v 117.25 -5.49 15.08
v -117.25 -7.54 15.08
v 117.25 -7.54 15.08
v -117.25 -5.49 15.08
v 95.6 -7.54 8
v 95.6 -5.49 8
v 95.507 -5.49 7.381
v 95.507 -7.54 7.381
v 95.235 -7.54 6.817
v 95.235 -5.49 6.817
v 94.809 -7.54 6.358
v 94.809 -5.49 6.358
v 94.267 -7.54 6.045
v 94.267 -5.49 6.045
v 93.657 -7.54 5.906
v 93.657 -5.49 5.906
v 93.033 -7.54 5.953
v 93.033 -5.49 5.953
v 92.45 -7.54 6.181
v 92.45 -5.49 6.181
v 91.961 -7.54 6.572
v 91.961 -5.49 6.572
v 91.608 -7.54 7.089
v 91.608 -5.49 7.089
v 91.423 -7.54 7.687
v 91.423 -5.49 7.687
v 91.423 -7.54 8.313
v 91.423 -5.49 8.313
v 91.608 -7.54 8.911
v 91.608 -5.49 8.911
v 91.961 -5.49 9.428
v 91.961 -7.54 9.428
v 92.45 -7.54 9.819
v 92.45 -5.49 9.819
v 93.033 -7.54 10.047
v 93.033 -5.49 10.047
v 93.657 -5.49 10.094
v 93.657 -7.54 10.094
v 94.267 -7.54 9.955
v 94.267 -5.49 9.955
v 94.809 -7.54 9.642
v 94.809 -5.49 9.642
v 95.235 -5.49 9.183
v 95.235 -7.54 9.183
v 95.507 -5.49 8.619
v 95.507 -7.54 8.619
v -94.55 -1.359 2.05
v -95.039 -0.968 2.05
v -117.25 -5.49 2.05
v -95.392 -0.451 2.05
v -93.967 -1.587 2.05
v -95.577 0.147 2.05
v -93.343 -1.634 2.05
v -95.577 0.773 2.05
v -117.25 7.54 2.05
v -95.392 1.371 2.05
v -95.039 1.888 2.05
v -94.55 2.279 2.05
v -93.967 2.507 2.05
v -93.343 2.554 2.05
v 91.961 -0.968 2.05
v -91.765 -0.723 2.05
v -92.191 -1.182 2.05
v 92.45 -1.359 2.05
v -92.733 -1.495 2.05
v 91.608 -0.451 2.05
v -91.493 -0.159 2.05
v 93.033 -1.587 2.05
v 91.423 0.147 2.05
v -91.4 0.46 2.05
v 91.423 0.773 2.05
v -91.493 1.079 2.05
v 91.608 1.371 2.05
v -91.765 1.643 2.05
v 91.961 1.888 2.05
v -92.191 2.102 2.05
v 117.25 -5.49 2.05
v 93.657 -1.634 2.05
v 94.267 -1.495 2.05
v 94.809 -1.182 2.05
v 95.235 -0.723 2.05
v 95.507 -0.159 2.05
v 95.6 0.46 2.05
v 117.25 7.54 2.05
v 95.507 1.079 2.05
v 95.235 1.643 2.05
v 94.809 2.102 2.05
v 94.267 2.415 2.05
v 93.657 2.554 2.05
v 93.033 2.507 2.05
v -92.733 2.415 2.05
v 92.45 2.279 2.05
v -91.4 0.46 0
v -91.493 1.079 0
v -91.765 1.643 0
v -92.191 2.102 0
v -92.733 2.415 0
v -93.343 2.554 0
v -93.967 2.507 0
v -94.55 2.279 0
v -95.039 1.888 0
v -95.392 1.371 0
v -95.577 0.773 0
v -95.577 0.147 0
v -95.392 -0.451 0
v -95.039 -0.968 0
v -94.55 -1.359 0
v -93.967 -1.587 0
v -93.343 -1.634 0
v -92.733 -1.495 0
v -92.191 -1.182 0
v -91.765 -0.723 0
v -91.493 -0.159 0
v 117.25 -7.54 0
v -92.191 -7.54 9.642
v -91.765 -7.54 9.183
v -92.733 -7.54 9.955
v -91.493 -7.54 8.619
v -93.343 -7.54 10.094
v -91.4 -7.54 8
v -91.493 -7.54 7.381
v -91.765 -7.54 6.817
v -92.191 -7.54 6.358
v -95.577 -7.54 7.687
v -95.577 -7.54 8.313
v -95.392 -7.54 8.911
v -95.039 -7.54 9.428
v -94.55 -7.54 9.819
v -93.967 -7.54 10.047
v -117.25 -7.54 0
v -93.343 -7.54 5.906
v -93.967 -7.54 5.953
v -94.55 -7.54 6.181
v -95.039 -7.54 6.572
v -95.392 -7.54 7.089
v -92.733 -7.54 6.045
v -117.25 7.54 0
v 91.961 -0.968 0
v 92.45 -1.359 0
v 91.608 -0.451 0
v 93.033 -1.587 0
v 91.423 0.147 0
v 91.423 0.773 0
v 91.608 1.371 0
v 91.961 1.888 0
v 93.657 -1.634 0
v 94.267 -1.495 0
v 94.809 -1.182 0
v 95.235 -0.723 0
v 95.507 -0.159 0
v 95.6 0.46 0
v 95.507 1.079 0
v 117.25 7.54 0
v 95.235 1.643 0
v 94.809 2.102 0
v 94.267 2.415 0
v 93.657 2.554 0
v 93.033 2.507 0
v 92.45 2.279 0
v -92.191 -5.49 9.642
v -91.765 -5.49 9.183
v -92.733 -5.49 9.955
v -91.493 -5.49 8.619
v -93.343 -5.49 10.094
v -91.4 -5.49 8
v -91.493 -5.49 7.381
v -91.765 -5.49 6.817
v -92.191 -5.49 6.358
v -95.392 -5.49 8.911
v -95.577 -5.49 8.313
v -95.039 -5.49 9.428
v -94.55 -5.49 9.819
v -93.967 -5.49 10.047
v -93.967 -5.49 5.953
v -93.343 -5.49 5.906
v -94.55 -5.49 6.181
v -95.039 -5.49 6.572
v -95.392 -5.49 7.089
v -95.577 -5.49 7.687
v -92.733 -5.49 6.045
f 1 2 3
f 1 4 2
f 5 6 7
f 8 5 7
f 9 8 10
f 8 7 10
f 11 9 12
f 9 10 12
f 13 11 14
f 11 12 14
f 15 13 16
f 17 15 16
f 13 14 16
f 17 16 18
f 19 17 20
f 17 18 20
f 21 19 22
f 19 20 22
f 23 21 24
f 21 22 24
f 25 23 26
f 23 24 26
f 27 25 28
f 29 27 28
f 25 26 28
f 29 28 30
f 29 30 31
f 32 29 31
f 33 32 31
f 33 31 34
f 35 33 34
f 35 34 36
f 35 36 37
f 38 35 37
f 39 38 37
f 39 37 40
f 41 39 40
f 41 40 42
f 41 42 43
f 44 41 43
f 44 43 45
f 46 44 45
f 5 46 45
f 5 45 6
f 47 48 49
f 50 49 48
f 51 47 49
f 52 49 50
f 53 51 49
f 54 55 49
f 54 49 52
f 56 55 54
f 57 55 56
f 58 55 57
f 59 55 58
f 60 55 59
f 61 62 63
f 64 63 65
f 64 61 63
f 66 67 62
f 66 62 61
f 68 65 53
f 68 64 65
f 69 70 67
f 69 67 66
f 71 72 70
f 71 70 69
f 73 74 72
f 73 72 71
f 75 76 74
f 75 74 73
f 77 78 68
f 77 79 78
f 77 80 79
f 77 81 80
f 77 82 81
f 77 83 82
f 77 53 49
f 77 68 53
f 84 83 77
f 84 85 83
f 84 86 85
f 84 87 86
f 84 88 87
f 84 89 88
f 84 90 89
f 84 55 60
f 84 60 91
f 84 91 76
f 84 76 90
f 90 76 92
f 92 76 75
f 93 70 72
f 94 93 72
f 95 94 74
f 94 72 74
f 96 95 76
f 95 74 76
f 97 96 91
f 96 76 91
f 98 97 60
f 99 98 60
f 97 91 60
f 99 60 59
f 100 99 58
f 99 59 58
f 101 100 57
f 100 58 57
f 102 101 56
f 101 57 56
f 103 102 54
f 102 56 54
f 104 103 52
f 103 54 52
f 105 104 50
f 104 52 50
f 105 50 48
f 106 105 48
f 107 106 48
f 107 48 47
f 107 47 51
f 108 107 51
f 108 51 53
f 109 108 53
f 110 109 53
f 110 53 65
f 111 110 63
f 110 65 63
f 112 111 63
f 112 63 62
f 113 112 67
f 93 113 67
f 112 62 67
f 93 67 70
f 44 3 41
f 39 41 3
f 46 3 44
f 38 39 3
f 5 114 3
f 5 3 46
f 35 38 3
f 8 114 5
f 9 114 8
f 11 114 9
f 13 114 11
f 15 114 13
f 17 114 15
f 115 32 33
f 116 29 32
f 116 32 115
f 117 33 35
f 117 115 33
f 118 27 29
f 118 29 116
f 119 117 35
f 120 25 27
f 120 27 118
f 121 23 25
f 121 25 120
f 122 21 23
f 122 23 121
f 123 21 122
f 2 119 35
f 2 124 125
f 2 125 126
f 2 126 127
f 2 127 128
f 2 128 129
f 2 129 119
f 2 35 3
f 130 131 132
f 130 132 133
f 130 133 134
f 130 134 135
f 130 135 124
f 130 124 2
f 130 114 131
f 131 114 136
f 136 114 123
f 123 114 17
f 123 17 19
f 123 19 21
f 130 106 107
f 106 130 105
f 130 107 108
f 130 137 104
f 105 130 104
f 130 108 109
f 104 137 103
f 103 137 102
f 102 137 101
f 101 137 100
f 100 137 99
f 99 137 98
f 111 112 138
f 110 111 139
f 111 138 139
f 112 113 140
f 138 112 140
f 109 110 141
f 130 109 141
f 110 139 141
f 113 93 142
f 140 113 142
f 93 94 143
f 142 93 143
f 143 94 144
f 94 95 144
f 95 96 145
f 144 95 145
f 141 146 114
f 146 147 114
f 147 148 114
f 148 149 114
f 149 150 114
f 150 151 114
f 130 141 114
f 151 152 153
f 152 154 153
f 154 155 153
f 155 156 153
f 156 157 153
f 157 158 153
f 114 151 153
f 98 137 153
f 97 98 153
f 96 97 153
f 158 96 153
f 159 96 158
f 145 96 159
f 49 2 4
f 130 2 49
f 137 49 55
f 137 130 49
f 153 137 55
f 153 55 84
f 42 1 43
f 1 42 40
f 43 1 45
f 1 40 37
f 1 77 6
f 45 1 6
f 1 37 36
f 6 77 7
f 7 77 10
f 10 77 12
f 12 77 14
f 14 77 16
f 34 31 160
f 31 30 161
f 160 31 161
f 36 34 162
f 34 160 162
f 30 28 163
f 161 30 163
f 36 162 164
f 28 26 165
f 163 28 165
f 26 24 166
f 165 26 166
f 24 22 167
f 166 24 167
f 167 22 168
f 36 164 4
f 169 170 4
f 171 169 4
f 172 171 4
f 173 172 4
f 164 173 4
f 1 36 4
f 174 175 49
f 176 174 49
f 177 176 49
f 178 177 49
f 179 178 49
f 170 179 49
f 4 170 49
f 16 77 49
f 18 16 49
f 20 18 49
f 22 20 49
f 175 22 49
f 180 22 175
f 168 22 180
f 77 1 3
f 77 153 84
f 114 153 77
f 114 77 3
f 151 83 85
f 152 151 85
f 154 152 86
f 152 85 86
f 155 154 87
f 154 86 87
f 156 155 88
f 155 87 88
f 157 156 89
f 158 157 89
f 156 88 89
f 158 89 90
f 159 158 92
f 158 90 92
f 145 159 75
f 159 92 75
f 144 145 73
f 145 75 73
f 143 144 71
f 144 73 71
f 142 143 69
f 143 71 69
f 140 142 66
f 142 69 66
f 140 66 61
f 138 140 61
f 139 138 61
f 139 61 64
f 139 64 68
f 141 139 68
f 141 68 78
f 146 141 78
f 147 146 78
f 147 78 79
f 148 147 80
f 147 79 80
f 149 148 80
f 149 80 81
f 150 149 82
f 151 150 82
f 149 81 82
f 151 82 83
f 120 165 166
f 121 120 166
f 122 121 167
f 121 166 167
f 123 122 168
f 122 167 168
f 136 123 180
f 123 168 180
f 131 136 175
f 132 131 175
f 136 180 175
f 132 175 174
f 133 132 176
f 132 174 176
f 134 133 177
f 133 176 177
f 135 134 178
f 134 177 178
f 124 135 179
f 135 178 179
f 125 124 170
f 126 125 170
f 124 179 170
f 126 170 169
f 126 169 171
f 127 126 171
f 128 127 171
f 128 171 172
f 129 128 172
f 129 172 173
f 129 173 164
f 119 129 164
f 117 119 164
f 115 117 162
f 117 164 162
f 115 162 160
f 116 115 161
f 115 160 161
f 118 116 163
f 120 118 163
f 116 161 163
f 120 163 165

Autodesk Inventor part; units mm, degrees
ref_plane "YZ Plane" through (0, 0, 0) normal (1, 0, 0) x (0, 1, 0)
ref_plane "XZ Plane" through (0, 0, 0) normal (0, 1, 0) x (-1, 0, 0)
ref_plane "XY Plane" through (0, 0, 0) normal (0, 0, 1) x (1, 0, 0)
sketch "Sketch1" plane through (0, 0, 0) normal (0, 0, 1) x (1, 0, 0)
  line L0 (117.25, -7.54) -> (-117.25, -7.54)
  line L1 (-117.25, -7.54) -> (-117.25, 7.54)
  line L2 (-117.25, 7.54) -> (117.25, 7.54)
  line L3 (117.25, 7.54) -> (117.25, -7.54)
  line L4 (117.25, -7.54) -> (-117.25, 7.54) construction
  line L5 (-117.25, -7.54) -> (117.25, 7.54) construction
  point P0 (0, 0)
  dimension "d0" = 234.5
  dimension "d1" = 15.08
extrude "Extrusion1" add sketch "Sketch1" along normal blind 2.05
sketch "Sketch2" plane through (0, 0, 2.05) normal (0, 0, 1) x (1, 0, 0)
  line L0 (-117.25, -7.54) -> (117.25, -7.54) projected
  line L1 (117.25, -7.54) -> (117.25, 7.54) projected
  line L2 (-117.25, -7.54) -> (117.25, -7.54)
  line L3 (117.25, -7.54) -> (117.25, -5.49)
  line L4 (117.25, -5.49) -> (-117.25, -5.49)
  line L5 (-117.25, -5.49) -> (-117.25, -7.54)
  point P0 (0, 0)
  dimension "d4" = 2.05
extrude "Extrusion2" add sketch "Sketch2" along normal blind 13.03
sketch "Sketch3" plane through (-117.25, -5.49, 2.05) normal (0, 1, 0) x (1, 0, 0)
  circle A0 centre (23.75, -5.95) radius 2.1
  circle A1 centre (210.75, -5.95) radius 2.1
  line L0 (117.25, 2.05) -> (117.25, -13.2508)
  line L1 (0, 2.05) -> (234.5, 2.05) projected
  dimension "d7" = 93.5
  dimension "d8" = 93.5
  dimension "d9" = 8
  dimension "d10" = 8
  dimension "d13" = 4.2
  dimension "d14" = 4.2
extrude "Extrusion3" cut sketch "Sketch3" against normal blind 2.05
sketch "Sketch4" plane through (0, 0, 2.05) normal (0, 0, 1) x (1, 0, 0)
  circle A0 centre (-93.5, 0.46) radius 2.1
  circle A1 centre (93.5, 0.46) radius 2.1
  line L0 (-117.25, -7.54) -> (117.25, -7.54) projected
  point P0 (0, 0)
  dimension "d15" = 4.2
  dimension "d16" = 4.2
  dimension "d17" = 8
  dimension "d18" = 93.5
  dimension "d19" = 93.5
  dimension "d20" = 8
extrude "Extrusion4" cut sketch "Sketch4" against normal blind 2.05
properties part number "L"
